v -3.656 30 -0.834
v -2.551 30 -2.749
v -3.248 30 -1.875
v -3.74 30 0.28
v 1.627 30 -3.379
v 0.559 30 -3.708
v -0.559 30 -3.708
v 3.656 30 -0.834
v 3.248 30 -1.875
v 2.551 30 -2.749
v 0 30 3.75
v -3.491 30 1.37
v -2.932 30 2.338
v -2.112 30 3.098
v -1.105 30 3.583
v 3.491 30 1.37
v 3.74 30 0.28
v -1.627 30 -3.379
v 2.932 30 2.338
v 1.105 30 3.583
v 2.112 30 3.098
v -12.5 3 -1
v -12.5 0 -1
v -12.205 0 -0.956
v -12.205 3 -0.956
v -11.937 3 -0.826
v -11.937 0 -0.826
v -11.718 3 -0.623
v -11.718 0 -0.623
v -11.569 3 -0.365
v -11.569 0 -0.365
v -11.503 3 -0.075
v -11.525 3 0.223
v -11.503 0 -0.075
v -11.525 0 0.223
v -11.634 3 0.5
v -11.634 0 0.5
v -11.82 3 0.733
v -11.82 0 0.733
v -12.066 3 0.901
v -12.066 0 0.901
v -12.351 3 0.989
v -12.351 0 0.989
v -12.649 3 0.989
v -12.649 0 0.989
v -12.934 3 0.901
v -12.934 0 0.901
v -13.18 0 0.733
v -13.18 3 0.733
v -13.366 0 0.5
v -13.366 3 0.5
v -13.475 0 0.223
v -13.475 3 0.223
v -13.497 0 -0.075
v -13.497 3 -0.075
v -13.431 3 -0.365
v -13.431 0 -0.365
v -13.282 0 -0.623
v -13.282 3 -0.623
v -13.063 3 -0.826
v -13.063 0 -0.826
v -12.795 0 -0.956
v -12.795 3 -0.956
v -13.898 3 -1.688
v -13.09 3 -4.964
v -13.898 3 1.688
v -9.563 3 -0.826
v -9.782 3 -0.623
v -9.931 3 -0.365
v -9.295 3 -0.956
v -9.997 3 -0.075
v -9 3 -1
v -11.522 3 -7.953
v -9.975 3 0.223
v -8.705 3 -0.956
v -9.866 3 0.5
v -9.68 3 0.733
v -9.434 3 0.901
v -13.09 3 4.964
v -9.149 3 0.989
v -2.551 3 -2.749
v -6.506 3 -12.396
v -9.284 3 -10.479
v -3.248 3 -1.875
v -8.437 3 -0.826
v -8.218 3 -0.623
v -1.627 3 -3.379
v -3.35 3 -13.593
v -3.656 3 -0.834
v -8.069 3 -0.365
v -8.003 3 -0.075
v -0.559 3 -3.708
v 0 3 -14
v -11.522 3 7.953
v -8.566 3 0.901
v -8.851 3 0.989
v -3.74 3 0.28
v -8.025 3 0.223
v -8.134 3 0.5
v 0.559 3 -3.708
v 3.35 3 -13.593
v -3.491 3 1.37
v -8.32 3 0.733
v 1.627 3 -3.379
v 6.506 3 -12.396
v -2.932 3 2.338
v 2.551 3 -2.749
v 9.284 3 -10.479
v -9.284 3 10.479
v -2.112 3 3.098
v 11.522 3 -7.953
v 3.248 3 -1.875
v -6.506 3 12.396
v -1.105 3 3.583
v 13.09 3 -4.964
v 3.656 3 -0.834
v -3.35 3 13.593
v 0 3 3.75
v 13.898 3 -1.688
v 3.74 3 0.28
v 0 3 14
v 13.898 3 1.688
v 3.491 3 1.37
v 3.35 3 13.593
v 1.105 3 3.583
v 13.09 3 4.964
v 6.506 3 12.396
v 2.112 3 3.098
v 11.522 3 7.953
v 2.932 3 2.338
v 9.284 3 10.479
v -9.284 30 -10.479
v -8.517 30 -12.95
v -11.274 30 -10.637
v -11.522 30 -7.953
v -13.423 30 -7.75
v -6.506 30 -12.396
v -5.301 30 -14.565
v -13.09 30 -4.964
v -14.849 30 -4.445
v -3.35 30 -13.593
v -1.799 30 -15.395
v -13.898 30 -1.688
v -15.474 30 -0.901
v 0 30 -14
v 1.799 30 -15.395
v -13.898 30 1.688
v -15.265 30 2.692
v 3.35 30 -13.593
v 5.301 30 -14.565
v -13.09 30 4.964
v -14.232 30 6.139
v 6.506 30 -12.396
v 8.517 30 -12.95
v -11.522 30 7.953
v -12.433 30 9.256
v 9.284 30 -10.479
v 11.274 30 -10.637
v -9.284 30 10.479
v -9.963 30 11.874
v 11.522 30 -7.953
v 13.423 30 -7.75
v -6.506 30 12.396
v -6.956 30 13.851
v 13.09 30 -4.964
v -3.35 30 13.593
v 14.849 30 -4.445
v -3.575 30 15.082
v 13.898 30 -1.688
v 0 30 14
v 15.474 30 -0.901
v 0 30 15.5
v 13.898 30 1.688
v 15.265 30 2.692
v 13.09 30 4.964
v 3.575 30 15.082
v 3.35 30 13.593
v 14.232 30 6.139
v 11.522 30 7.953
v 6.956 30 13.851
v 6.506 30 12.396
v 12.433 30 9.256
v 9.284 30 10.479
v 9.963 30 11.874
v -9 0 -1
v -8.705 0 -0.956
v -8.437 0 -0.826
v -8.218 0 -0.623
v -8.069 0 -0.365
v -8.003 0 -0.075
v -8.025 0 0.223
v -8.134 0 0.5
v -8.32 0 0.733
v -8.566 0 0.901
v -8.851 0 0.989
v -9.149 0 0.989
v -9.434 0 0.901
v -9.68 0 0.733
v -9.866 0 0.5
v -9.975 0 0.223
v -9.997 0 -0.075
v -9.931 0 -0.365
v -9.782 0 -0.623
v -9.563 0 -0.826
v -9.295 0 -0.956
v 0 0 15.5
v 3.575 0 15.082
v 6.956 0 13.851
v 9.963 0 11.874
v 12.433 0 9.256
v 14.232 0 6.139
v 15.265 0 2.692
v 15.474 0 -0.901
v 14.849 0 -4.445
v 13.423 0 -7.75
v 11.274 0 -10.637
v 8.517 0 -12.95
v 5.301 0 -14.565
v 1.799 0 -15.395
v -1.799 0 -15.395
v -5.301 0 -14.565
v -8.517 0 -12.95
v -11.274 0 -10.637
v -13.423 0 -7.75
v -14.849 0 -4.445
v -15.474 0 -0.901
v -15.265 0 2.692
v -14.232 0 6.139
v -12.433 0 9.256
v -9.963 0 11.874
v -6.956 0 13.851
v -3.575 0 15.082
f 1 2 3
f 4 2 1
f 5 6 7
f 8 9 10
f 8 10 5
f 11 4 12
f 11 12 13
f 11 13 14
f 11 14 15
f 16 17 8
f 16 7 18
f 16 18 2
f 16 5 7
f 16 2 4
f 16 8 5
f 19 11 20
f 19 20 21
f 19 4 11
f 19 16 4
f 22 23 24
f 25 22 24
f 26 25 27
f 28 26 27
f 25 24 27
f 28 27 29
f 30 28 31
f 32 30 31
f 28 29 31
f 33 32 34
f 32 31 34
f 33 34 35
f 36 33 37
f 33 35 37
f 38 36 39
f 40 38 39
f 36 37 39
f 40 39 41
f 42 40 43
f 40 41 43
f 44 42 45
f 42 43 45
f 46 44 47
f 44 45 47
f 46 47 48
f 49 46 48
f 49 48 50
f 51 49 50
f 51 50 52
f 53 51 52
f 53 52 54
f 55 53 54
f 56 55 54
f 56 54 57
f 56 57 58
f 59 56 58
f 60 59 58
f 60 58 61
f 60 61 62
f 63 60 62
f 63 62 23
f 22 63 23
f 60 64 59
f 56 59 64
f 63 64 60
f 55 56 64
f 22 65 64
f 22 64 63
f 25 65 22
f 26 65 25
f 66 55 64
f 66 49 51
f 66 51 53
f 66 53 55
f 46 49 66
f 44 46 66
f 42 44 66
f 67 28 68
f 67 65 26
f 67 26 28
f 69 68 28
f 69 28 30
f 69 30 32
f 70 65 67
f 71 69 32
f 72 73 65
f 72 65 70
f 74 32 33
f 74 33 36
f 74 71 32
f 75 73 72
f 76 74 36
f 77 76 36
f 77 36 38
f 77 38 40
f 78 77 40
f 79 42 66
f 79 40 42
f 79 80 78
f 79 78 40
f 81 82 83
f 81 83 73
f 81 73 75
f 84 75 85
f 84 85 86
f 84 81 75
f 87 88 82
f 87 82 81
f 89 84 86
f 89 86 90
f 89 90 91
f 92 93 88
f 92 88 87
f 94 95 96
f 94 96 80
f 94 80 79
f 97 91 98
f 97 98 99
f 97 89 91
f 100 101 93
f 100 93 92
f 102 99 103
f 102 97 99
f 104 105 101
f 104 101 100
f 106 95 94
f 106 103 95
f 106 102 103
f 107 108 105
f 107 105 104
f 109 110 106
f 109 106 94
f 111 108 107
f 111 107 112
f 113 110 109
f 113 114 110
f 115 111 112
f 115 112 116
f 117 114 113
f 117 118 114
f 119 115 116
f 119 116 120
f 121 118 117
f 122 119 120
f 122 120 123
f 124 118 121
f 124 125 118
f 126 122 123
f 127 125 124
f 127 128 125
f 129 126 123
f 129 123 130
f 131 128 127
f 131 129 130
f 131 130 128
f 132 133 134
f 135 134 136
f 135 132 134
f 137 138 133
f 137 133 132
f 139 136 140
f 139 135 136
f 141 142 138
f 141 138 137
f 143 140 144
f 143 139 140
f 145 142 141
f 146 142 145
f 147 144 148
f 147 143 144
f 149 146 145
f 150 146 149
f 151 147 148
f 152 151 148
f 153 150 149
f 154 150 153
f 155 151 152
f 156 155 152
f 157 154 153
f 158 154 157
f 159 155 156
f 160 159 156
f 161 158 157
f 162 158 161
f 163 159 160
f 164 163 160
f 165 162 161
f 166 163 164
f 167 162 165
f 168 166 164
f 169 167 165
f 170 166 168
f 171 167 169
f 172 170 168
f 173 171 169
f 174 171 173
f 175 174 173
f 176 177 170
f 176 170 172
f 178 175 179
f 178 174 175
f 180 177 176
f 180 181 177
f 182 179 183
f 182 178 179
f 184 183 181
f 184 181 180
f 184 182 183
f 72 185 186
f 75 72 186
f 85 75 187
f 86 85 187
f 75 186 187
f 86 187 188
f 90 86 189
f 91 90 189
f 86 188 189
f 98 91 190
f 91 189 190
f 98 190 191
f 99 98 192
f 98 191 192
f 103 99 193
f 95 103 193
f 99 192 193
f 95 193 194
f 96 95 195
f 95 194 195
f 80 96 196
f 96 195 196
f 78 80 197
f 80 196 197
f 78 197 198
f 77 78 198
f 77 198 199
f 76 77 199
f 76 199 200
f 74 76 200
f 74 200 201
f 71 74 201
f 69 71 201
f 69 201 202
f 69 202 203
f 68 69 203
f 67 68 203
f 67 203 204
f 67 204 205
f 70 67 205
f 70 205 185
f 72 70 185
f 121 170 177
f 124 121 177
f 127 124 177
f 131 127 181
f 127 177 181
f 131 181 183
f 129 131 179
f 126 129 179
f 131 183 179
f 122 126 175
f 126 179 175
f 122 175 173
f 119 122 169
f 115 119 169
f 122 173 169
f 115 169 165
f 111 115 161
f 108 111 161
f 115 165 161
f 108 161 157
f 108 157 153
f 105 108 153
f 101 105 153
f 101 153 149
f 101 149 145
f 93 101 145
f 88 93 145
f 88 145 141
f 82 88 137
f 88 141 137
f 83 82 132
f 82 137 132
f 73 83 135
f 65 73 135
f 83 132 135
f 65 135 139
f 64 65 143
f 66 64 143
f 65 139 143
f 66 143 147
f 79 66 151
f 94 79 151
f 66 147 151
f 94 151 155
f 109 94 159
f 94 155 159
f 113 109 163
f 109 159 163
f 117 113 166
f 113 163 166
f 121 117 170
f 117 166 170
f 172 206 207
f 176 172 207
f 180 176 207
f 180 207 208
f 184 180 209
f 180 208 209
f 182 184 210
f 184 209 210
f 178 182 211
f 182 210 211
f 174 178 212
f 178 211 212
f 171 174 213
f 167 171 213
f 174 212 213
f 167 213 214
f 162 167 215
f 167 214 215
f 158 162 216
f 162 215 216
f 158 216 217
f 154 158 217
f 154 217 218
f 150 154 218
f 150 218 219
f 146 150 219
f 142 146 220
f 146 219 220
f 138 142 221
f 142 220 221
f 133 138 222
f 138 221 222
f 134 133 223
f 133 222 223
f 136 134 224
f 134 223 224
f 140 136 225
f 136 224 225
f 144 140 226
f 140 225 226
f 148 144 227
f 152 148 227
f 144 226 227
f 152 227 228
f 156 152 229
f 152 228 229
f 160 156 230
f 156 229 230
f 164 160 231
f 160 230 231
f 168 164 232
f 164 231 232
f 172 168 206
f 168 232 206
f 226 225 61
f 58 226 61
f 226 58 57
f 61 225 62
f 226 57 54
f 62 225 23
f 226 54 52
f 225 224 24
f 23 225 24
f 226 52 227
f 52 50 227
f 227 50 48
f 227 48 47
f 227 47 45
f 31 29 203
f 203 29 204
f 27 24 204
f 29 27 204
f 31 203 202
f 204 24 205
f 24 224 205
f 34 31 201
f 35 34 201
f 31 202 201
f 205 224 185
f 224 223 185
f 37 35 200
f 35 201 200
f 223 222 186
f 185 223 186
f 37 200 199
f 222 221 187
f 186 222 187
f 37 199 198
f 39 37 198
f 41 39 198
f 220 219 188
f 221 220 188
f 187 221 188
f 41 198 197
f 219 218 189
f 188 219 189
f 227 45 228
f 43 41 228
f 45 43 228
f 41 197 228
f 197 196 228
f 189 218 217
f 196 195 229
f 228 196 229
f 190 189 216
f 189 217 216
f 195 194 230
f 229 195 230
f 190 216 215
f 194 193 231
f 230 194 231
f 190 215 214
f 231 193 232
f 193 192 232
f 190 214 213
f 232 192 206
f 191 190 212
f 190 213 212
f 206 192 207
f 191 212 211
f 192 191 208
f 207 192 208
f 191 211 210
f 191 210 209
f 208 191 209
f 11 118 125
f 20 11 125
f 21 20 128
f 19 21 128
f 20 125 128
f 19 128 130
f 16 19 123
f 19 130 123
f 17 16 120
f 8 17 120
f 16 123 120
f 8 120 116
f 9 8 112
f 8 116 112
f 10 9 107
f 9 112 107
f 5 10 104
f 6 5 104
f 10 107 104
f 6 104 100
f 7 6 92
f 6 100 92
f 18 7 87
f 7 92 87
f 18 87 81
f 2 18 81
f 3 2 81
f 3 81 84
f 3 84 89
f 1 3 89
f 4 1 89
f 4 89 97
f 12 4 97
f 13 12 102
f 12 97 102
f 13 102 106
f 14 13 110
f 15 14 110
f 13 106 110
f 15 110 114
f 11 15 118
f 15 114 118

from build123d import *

# Parameters (mm, degrees)
SKETCH1_R           = 15.5
BOSS_EXTRUDE1_DEPTH = 30
SKETCH2_R           = 14
CUT_EXTRUDE1_DEPTH  = 27
SKETCH3_R           = 1
CUT_EXTRUDE2_DEPTH  = 10
SKETCH4_R           = 3.75
BOSS_EXTRUDE2_DEPTH = 27


with BuildPart() as part:
    # Sketch1 → Boss-Extrude1 (new body)
    with BuildSketch(Plane(origin=(0, 0, 0), x_dir=(1, 0, 0), z_dir=(0, 1, 0))):
        with Locations(Location((0, 0, 0), (0, 0, 270))):
            Circle(SKETCH1_R)
    extrude(amount=BOSS_EXTRUDE1_DEPTH)

    # Sketch2 → Cut-Extrude1 (cut)
    with BuildSketch(Plane(origin=(0, 30, 0), x_dir=(1, 0, 0), z_dir=(0, 1, 0))):
        with Locations(Location((0, 0, 0), (0, 0, 270))):
            Circle(SKETCH2_R)
    extrude(amount=-CUT_EXTRUDE1_DEPTH, mode=Mode.SUBTRACT)

    # Sketch3 → Cut-Extrude2 (cut)
    with BuildSketch(Plane.XZ):
        with Locations(Location((-9, 0, 0), (0, 0, 270))):
            Circle(SKETCH3_R)
        with Locations(Location((-12.5, 0, 0), (0, 0, 270))):
            Circle(SKETCH3_R)
    extrude(amount=-CUT_EXTRUDE2_DEPTH, mode=Mode.SUBTRACT)

    # Sketch4 → Boss-Extrude2 (add)
    with BuildSketch(Plane(origin=(0, 3, 0), x_dir=(1, 0, 0), z_dir=(0, 1, 0))):
        with Locations(Location((0, 0, 0), (0, 0, 270))):
            Circle(SKETCH4_R)
    extrude(amount=BOSS_EXTRUDE2_DEPTH)


solid = part.part
